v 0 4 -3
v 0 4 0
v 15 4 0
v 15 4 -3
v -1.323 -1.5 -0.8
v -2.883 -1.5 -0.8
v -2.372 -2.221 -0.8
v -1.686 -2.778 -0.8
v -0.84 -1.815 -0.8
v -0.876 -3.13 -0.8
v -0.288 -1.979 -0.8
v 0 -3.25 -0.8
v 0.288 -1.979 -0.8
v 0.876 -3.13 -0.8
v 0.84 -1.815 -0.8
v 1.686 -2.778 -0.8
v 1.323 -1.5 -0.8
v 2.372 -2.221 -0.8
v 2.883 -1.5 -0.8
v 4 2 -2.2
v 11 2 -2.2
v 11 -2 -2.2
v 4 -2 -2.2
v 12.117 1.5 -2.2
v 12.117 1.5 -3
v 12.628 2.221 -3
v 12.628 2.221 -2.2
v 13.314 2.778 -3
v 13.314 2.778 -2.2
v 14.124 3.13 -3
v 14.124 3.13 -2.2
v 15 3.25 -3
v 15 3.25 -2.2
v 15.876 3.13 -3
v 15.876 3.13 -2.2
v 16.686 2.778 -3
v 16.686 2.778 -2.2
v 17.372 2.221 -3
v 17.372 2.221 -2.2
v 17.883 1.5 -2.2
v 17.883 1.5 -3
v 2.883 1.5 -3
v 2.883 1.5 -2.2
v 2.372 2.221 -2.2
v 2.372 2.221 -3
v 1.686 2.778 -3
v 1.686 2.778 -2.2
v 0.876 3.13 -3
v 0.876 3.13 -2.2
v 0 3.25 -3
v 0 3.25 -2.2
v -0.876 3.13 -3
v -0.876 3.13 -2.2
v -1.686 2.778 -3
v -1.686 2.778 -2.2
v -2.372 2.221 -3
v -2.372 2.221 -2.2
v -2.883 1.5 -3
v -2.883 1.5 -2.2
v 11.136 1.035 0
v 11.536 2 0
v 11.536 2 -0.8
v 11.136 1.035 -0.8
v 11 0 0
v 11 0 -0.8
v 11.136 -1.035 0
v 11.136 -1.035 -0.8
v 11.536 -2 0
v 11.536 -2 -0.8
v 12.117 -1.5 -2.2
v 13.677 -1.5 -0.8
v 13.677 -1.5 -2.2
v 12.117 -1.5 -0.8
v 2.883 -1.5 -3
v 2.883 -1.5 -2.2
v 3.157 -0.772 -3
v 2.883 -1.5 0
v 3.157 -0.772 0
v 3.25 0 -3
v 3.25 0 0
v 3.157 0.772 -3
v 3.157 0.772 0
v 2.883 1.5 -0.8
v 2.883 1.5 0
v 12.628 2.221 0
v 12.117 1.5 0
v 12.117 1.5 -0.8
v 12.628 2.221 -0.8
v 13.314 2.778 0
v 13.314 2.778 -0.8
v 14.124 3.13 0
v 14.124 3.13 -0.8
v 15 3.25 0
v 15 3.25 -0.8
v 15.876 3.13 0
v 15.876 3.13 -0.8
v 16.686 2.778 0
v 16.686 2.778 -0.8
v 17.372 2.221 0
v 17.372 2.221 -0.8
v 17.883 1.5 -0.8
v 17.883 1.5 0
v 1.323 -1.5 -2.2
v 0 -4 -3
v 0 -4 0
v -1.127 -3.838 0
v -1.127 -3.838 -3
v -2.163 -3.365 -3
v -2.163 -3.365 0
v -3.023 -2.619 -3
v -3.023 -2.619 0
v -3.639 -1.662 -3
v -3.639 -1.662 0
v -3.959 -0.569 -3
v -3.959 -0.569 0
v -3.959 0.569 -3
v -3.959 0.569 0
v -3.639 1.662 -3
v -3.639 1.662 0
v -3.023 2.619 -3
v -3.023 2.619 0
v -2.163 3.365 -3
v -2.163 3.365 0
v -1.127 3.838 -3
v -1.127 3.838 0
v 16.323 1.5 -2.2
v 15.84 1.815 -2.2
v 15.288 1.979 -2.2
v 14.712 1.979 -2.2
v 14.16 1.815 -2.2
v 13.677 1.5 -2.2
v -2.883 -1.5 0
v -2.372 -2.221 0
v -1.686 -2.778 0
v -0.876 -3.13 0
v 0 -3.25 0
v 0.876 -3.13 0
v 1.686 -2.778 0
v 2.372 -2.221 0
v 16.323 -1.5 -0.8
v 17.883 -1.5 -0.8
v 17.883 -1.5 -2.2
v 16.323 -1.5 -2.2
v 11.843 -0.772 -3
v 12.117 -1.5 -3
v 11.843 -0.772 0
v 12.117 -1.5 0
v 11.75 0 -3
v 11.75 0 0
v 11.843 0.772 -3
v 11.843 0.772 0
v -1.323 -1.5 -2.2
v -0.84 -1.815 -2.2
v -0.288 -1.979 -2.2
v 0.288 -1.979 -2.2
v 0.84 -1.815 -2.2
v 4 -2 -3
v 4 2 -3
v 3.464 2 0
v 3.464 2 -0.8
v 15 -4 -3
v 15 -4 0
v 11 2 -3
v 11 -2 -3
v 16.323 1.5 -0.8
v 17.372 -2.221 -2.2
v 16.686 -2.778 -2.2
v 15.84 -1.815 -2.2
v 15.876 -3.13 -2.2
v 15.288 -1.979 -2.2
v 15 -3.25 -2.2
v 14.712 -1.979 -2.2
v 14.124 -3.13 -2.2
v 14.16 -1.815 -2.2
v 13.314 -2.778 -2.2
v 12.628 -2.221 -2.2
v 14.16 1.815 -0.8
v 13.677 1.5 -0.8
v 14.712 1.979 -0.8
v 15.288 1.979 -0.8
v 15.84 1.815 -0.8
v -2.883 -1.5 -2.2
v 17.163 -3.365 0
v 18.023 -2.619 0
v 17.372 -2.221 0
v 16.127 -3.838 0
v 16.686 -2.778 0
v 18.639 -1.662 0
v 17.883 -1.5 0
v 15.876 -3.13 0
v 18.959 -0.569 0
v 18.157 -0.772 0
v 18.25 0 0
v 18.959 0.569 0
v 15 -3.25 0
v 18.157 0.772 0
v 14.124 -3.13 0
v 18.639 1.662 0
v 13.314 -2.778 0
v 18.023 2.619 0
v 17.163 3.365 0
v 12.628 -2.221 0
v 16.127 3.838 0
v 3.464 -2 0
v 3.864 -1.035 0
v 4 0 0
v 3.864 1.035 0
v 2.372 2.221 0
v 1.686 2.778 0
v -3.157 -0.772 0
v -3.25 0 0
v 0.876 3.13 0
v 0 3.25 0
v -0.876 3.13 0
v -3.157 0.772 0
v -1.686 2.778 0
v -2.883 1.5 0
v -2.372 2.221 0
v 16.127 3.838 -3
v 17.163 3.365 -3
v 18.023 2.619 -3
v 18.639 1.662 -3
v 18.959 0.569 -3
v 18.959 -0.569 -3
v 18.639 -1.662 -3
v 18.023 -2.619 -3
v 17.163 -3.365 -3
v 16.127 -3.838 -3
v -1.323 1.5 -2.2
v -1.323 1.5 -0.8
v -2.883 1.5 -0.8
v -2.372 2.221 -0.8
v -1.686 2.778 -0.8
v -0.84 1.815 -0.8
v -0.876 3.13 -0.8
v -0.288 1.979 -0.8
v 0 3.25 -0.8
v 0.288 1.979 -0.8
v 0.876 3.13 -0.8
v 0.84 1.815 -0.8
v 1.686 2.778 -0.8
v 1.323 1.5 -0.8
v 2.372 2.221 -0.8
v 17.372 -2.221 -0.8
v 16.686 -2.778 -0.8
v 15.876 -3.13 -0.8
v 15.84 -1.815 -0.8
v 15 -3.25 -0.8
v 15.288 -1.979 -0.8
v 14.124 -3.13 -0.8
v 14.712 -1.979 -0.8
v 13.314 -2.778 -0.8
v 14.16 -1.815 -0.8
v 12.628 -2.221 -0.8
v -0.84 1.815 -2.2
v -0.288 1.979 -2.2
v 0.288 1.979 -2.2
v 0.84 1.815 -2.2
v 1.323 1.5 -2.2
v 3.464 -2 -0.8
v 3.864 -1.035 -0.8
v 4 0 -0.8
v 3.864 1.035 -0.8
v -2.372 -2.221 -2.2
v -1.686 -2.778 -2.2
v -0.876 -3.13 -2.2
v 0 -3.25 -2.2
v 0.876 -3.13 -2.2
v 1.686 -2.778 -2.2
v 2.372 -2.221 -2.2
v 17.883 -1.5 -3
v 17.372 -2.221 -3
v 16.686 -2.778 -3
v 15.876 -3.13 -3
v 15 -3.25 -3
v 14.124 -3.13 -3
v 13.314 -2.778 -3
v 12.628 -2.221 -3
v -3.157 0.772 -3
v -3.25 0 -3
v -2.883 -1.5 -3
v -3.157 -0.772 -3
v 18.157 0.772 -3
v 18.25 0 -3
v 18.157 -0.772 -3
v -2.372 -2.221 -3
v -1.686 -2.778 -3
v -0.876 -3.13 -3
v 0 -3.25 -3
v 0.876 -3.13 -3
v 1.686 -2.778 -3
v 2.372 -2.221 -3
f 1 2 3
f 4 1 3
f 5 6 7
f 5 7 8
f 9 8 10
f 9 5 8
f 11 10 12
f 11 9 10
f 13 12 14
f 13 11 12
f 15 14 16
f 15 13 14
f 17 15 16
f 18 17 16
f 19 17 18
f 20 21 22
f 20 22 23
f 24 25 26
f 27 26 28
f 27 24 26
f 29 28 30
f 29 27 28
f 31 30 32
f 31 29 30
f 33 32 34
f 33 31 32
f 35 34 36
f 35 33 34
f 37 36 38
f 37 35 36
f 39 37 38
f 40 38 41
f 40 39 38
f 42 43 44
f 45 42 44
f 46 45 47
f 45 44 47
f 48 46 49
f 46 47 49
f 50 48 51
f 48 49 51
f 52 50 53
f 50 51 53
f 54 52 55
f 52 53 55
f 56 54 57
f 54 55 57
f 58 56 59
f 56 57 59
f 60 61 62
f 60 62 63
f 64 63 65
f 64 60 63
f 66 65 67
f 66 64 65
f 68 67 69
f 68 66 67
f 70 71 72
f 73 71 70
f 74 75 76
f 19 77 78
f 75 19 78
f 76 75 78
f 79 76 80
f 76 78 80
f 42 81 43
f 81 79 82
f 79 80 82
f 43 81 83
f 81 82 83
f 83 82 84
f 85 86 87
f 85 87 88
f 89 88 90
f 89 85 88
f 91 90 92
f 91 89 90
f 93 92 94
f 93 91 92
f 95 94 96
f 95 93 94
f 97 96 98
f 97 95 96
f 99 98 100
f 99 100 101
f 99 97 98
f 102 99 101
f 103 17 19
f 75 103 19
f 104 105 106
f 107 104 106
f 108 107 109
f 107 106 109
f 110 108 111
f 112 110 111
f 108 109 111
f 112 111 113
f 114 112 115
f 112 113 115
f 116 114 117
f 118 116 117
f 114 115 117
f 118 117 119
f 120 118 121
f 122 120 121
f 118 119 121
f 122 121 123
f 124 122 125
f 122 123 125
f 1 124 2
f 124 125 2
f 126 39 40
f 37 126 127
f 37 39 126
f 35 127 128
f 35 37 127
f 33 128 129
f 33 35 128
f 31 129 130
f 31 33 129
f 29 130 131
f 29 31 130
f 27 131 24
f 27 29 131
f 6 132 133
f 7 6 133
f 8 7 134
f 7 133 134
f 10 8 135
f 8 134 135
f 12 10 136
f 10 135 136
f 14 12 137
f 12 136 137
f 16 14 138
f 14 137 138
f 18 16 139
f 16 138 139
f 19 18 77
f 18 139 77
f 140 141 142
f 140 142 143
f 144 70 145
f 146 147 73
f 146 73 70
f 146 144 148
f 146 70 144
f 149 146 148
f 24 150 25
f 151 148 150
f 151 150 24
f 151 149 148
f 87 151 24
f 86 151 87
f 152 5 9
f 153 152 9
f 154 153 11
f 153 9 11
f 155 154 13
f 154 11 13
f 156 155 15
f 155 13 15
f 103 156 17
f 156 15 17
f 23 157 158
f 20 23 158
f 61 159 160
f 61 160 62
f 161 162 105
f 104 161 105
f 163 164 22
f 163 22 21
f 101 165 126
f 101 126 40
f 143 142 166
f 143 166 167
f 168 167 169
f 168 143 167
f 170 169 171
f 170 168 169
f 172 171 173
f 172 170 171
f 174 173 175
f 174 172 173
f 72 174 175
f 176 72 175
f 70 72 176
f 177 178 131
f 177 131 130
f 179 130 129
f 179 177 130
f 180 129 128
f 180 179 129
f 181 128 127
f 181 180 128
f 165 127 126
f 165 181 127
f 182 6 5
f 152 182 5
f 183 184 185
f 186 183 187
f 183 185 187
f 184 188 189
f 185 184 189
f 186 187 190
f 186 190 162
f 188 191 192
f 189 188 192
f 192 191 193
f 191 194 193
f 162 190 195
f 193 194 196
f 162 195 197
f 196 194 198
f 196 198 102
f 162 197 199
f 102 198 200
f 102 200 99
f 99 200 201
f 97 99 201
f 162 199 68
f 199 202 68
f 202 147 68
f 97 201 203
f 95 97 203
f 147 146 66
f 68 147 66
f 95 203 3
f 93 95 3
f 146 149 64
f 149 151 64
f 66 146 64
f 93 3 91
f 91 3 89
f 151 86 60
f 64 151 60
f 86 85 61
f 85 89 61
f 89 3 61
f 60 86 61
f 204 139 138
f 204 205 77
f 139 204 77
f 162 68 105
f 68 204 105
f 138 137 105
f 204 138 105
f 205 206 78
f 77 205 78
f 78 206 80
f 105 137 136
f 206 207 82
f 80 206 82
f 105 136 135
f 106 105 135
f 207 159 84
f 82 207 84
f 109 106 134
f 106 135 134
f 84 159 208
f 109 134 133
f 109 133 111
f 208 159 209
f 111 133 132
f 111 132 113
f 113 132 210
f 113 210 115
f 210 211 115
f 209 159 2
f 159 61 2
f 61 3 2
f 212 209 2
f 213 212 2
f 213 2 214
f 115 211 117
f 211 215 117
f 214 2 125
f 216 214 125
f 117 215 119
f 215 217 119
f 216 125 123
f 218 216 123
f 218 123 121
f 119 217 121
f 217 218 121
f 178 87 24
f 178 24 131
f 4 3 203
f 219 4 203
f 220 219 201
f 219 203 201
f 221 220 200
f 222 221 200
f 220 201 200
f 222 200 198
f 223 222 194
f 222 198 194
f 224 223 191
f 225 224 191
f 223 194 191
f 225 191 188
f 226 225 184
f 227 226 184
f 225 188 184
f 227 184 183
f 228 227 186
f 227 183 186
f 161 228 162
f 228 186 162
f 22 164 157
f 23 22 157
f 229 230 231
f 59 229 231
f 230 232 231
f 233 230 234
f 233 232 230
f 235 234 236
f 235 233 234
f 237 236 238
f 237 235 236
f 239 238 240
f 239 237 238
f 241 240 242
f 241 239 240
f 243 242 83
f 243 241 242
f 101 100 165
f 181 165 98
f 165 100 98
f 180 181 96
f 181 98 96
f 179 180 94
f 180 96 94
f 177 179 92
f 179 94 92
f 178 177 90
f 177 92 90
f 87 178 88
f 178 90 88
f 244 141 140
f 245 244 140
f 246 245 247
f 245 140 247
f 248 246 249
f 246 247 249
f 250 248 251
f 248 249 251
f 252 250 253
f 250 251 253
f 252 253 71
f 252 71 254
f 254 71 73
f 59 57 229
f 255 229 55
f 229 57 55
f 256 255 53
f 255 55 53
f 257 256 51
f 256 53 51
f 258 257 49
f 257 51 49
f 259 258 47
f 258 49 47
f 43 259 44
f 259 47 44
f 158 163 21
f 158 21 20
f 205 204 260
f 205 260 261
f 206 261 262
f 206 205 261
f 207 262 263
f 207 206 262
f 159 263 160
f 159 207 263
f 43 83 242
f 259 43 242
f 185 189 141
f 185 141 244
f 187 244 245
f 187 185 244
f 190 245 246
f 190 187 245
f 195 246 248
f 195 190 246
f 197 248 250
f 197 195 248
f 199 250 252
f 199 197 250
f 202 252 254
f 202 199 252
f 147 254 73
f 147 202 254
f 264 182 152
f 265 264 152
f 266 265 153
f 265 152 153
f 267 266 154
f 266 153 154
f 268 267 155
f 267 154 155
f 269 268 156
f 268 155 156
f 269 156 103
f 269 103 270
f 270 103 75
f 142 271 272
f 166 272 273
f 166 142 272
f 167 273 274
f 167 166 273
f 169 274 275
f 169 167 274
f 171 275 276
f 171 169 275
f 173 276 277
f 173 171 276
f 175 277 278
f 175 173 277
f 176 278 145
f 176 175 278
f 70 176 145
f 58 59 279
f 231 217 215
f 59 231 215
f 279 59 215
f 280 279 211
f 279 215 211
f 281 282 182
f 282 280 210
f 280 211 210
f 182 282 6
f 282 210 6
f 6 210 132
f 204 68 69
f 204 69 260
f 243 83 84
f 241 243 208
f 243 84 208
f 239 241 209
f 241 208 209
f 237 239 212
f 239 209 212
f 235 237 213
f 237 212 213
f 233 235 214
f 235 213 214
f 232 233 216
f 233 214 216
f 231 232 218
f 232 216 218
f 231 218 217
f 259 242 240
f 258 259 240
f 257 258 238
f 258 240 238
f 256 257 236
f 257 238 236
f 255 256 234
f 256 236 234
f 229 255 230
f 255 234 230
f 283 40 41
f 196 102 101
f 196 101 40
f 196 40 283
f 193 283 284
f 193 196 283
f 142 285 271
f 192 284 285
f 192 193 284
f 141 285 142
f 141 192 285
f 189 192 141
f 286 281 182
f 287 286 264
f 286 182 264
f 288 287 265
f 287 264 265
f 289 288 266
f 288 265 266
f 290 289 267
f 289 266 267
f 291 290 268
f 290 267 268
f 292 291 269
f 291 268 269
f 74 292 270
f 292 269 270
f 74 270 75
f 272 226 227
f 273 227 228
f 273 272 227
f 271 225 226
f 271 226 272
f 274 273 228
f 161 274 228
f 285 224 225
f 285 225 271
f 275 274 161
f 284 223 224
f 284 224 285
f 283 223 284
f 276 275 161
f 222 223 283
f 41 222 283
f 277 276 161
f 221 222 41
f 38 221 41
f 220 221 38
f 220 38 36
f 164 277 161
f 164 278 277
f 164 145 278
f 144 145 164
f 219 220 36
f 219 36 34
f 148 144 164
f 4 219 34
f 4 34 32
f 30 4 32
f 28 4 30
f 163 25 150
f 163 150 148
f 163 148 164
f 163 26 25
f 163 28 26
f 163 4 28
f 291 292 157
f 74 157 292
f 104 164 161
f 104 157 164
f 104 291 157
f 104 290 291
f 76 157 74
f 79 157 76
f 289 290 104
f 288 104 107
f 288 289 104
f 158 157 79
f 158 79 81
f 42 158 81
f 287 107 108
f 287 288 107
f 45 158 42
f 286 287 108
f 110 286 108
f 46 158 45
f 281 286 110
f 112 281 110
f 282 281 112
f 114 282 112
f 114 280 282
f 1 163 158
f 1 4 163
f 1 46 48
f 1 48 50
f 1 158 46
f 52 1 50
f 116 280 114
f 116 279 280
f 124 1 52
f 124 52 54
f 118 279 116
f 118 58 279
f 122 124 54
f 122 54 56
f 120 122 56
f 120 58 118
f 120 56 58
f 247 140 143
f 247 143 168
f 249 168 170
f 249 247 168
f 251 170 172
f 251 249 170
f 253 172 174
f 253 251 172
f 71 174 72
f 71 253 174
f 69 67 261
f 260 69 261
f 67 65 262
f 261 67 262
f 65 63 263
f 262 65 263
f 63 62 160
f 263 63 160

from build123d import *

# Parameters (mm, degrees)
EXTRUDE_1_DEPTH     = 3
CUT_EXTRUDE_1_REACH = 21.647
SKETCH_3_R          = 3.25
CUT_EXTRUDE_2_DEPTH = 0.8
CUT_EXTRUDE_START   = -2.2
SKETCH_3_2_R        = 3.25
CUT_EXTRUDE_3_DEPTH = 0.8
CUT_EXTRUDE_4_DEPTH = 0.8
SKETCH_5_W          = 7
SKETCH_5_H          = 4
CUT_EXTRUDE_5_DEPTH = 0.8


with BuildPart() as part:
    # 草图1 → 凸台-拉伸1 (new body)
    with BuildSketch(Plane.XY):
        with BuildLine():
            Line((0, 4), (15, 4))
            ThreePointArc((15, 4), (19, 0), (15, -4))
            Line((15, -4), (0, -4))
            ThreePointArc((0, -4), (-4, 0), (0, 4))
        make_face()
    extrude(amount=-EXTRUDE_1_DEPTH)

    # 草图2 → 切除-拉伸1 (cut, up to next)
    with BuildSketch(Plane.XY, mode=Mode.PRIVATE) as cut_extrude_1_sk1:
        with BuildLine():
            Line((1.322875656, -1.5), (2.883140649, -1.5))
            ThreePointArc((2.883140649, -1.5), (3.25, 0), (2.883140649, 1.5))
            Line((2.883140649, 1.5), (1.322875656, 1.5))
            ThreePointArc((1.322875656, 1.5), (0, 2), (-1.322875656, 1.5))
            Line((-1.322875656, 1.5), (-2.883140649, 1.5))
            ThreePointArc((-2.883140649, 1.5), (-3.25, 0), (-2.883140649, -1.5))
            Line((-2.883140649, -1.5), (-1.322875656, -1.5))
            ThreePointArc((-1.322875656, -1.5), (0, -2), (1.322875656, -1.5))
        make_face()
    cut_extrude_1_tool1 = extrude(cut_extrude_1_sk1.sketch, amount=-CUT_EXTRUDE_1_REACH, mode=Mode.PRIVATE) & part.part
    cut_extrude_1 = cut_extrude_1_tool1.solids().sort_by_distance((0, 0, 0))[0]
    add(cut_extrude_1, mode=Mode.SUBTRACT)

    # 草图3 → 切除-拉伸2 (cut)
    with BuildSketch(Plane.XY):
        Circle(SKETCH_3_R)
    cut_extrude_2 = extrude(amount=-CUT_EXTRUDE_2_DEPTH, mode=Mode.SUBTRACT)

    # 草图3<2> → 切除-拉伸3 (cut)
    with BuildSketch(Plane.XY.offset(CUT_EXTRUDE_START)):
        Circle(SKETCH_3_2_R)
    cut_extrude_3 = extrude(amount=-CUT_EXTRUDE_3_DEPTH, mode=Mode.SUBTRACT)

    # 镜向1: 切除-拉伸1, 切除-拉伸2, 切除-拉伸3 across plane
    add(cut_extrude_1.mirror(Plane(origin=(7.5, 0, 0), x_dir=(0, 0, 1), z_dir=(1, 0, 0))), mode=Mode.SUBTRACT)
    add(cut_extrude_2.mirror(Plane(origin=(7.5, 0, 0), x_dir=(0, 0, 1), z_dir=(1, 0, 0))), mode=Mode.SUBTRACT)
    add(cut_extrude_3.mirror(Plane(origin=(7.5, 0, 0), x_dir=(0, 0, 1), z_dir=(1, 0, 0))), mode=Mode.SUBTRACT)

    # 草图4 → 切除-拉伸4 (cut)
    with BuildSketch(Plane.XY):
        with BuildLine():
            Line((3.464101615, 2), (11.535898385, 2))
            ThreePointArc((11.535898385, 2), (11, 0), (11.535898385, -2))
            Line((11.535898385, -2), (3.464101615, -2))
            ThreePointArc((3.464101615, -2), (4, 0), (3.464101615, 2))
        make_face()
    extrude(amount=-CUT_EXTRUDE_4_DEPTH, mode=Mode.SUBTRACT)

    # 草图5 → 切除-拉伸5 (cut)
    with BuildSketch(Plane(origin=(0, 0, -3), x_dir=(-1, 0, 0), z_dir=(0, 0, -1))):
        with Locations((-7.5, 0)):
            Rectangle(SKETCH_5_W, SKETCH_5_H)
    extrude(amount=-CUT_EXTRUDE_5_DEPTH, mode=Mode.SUBTRACT)


solid = part.part
